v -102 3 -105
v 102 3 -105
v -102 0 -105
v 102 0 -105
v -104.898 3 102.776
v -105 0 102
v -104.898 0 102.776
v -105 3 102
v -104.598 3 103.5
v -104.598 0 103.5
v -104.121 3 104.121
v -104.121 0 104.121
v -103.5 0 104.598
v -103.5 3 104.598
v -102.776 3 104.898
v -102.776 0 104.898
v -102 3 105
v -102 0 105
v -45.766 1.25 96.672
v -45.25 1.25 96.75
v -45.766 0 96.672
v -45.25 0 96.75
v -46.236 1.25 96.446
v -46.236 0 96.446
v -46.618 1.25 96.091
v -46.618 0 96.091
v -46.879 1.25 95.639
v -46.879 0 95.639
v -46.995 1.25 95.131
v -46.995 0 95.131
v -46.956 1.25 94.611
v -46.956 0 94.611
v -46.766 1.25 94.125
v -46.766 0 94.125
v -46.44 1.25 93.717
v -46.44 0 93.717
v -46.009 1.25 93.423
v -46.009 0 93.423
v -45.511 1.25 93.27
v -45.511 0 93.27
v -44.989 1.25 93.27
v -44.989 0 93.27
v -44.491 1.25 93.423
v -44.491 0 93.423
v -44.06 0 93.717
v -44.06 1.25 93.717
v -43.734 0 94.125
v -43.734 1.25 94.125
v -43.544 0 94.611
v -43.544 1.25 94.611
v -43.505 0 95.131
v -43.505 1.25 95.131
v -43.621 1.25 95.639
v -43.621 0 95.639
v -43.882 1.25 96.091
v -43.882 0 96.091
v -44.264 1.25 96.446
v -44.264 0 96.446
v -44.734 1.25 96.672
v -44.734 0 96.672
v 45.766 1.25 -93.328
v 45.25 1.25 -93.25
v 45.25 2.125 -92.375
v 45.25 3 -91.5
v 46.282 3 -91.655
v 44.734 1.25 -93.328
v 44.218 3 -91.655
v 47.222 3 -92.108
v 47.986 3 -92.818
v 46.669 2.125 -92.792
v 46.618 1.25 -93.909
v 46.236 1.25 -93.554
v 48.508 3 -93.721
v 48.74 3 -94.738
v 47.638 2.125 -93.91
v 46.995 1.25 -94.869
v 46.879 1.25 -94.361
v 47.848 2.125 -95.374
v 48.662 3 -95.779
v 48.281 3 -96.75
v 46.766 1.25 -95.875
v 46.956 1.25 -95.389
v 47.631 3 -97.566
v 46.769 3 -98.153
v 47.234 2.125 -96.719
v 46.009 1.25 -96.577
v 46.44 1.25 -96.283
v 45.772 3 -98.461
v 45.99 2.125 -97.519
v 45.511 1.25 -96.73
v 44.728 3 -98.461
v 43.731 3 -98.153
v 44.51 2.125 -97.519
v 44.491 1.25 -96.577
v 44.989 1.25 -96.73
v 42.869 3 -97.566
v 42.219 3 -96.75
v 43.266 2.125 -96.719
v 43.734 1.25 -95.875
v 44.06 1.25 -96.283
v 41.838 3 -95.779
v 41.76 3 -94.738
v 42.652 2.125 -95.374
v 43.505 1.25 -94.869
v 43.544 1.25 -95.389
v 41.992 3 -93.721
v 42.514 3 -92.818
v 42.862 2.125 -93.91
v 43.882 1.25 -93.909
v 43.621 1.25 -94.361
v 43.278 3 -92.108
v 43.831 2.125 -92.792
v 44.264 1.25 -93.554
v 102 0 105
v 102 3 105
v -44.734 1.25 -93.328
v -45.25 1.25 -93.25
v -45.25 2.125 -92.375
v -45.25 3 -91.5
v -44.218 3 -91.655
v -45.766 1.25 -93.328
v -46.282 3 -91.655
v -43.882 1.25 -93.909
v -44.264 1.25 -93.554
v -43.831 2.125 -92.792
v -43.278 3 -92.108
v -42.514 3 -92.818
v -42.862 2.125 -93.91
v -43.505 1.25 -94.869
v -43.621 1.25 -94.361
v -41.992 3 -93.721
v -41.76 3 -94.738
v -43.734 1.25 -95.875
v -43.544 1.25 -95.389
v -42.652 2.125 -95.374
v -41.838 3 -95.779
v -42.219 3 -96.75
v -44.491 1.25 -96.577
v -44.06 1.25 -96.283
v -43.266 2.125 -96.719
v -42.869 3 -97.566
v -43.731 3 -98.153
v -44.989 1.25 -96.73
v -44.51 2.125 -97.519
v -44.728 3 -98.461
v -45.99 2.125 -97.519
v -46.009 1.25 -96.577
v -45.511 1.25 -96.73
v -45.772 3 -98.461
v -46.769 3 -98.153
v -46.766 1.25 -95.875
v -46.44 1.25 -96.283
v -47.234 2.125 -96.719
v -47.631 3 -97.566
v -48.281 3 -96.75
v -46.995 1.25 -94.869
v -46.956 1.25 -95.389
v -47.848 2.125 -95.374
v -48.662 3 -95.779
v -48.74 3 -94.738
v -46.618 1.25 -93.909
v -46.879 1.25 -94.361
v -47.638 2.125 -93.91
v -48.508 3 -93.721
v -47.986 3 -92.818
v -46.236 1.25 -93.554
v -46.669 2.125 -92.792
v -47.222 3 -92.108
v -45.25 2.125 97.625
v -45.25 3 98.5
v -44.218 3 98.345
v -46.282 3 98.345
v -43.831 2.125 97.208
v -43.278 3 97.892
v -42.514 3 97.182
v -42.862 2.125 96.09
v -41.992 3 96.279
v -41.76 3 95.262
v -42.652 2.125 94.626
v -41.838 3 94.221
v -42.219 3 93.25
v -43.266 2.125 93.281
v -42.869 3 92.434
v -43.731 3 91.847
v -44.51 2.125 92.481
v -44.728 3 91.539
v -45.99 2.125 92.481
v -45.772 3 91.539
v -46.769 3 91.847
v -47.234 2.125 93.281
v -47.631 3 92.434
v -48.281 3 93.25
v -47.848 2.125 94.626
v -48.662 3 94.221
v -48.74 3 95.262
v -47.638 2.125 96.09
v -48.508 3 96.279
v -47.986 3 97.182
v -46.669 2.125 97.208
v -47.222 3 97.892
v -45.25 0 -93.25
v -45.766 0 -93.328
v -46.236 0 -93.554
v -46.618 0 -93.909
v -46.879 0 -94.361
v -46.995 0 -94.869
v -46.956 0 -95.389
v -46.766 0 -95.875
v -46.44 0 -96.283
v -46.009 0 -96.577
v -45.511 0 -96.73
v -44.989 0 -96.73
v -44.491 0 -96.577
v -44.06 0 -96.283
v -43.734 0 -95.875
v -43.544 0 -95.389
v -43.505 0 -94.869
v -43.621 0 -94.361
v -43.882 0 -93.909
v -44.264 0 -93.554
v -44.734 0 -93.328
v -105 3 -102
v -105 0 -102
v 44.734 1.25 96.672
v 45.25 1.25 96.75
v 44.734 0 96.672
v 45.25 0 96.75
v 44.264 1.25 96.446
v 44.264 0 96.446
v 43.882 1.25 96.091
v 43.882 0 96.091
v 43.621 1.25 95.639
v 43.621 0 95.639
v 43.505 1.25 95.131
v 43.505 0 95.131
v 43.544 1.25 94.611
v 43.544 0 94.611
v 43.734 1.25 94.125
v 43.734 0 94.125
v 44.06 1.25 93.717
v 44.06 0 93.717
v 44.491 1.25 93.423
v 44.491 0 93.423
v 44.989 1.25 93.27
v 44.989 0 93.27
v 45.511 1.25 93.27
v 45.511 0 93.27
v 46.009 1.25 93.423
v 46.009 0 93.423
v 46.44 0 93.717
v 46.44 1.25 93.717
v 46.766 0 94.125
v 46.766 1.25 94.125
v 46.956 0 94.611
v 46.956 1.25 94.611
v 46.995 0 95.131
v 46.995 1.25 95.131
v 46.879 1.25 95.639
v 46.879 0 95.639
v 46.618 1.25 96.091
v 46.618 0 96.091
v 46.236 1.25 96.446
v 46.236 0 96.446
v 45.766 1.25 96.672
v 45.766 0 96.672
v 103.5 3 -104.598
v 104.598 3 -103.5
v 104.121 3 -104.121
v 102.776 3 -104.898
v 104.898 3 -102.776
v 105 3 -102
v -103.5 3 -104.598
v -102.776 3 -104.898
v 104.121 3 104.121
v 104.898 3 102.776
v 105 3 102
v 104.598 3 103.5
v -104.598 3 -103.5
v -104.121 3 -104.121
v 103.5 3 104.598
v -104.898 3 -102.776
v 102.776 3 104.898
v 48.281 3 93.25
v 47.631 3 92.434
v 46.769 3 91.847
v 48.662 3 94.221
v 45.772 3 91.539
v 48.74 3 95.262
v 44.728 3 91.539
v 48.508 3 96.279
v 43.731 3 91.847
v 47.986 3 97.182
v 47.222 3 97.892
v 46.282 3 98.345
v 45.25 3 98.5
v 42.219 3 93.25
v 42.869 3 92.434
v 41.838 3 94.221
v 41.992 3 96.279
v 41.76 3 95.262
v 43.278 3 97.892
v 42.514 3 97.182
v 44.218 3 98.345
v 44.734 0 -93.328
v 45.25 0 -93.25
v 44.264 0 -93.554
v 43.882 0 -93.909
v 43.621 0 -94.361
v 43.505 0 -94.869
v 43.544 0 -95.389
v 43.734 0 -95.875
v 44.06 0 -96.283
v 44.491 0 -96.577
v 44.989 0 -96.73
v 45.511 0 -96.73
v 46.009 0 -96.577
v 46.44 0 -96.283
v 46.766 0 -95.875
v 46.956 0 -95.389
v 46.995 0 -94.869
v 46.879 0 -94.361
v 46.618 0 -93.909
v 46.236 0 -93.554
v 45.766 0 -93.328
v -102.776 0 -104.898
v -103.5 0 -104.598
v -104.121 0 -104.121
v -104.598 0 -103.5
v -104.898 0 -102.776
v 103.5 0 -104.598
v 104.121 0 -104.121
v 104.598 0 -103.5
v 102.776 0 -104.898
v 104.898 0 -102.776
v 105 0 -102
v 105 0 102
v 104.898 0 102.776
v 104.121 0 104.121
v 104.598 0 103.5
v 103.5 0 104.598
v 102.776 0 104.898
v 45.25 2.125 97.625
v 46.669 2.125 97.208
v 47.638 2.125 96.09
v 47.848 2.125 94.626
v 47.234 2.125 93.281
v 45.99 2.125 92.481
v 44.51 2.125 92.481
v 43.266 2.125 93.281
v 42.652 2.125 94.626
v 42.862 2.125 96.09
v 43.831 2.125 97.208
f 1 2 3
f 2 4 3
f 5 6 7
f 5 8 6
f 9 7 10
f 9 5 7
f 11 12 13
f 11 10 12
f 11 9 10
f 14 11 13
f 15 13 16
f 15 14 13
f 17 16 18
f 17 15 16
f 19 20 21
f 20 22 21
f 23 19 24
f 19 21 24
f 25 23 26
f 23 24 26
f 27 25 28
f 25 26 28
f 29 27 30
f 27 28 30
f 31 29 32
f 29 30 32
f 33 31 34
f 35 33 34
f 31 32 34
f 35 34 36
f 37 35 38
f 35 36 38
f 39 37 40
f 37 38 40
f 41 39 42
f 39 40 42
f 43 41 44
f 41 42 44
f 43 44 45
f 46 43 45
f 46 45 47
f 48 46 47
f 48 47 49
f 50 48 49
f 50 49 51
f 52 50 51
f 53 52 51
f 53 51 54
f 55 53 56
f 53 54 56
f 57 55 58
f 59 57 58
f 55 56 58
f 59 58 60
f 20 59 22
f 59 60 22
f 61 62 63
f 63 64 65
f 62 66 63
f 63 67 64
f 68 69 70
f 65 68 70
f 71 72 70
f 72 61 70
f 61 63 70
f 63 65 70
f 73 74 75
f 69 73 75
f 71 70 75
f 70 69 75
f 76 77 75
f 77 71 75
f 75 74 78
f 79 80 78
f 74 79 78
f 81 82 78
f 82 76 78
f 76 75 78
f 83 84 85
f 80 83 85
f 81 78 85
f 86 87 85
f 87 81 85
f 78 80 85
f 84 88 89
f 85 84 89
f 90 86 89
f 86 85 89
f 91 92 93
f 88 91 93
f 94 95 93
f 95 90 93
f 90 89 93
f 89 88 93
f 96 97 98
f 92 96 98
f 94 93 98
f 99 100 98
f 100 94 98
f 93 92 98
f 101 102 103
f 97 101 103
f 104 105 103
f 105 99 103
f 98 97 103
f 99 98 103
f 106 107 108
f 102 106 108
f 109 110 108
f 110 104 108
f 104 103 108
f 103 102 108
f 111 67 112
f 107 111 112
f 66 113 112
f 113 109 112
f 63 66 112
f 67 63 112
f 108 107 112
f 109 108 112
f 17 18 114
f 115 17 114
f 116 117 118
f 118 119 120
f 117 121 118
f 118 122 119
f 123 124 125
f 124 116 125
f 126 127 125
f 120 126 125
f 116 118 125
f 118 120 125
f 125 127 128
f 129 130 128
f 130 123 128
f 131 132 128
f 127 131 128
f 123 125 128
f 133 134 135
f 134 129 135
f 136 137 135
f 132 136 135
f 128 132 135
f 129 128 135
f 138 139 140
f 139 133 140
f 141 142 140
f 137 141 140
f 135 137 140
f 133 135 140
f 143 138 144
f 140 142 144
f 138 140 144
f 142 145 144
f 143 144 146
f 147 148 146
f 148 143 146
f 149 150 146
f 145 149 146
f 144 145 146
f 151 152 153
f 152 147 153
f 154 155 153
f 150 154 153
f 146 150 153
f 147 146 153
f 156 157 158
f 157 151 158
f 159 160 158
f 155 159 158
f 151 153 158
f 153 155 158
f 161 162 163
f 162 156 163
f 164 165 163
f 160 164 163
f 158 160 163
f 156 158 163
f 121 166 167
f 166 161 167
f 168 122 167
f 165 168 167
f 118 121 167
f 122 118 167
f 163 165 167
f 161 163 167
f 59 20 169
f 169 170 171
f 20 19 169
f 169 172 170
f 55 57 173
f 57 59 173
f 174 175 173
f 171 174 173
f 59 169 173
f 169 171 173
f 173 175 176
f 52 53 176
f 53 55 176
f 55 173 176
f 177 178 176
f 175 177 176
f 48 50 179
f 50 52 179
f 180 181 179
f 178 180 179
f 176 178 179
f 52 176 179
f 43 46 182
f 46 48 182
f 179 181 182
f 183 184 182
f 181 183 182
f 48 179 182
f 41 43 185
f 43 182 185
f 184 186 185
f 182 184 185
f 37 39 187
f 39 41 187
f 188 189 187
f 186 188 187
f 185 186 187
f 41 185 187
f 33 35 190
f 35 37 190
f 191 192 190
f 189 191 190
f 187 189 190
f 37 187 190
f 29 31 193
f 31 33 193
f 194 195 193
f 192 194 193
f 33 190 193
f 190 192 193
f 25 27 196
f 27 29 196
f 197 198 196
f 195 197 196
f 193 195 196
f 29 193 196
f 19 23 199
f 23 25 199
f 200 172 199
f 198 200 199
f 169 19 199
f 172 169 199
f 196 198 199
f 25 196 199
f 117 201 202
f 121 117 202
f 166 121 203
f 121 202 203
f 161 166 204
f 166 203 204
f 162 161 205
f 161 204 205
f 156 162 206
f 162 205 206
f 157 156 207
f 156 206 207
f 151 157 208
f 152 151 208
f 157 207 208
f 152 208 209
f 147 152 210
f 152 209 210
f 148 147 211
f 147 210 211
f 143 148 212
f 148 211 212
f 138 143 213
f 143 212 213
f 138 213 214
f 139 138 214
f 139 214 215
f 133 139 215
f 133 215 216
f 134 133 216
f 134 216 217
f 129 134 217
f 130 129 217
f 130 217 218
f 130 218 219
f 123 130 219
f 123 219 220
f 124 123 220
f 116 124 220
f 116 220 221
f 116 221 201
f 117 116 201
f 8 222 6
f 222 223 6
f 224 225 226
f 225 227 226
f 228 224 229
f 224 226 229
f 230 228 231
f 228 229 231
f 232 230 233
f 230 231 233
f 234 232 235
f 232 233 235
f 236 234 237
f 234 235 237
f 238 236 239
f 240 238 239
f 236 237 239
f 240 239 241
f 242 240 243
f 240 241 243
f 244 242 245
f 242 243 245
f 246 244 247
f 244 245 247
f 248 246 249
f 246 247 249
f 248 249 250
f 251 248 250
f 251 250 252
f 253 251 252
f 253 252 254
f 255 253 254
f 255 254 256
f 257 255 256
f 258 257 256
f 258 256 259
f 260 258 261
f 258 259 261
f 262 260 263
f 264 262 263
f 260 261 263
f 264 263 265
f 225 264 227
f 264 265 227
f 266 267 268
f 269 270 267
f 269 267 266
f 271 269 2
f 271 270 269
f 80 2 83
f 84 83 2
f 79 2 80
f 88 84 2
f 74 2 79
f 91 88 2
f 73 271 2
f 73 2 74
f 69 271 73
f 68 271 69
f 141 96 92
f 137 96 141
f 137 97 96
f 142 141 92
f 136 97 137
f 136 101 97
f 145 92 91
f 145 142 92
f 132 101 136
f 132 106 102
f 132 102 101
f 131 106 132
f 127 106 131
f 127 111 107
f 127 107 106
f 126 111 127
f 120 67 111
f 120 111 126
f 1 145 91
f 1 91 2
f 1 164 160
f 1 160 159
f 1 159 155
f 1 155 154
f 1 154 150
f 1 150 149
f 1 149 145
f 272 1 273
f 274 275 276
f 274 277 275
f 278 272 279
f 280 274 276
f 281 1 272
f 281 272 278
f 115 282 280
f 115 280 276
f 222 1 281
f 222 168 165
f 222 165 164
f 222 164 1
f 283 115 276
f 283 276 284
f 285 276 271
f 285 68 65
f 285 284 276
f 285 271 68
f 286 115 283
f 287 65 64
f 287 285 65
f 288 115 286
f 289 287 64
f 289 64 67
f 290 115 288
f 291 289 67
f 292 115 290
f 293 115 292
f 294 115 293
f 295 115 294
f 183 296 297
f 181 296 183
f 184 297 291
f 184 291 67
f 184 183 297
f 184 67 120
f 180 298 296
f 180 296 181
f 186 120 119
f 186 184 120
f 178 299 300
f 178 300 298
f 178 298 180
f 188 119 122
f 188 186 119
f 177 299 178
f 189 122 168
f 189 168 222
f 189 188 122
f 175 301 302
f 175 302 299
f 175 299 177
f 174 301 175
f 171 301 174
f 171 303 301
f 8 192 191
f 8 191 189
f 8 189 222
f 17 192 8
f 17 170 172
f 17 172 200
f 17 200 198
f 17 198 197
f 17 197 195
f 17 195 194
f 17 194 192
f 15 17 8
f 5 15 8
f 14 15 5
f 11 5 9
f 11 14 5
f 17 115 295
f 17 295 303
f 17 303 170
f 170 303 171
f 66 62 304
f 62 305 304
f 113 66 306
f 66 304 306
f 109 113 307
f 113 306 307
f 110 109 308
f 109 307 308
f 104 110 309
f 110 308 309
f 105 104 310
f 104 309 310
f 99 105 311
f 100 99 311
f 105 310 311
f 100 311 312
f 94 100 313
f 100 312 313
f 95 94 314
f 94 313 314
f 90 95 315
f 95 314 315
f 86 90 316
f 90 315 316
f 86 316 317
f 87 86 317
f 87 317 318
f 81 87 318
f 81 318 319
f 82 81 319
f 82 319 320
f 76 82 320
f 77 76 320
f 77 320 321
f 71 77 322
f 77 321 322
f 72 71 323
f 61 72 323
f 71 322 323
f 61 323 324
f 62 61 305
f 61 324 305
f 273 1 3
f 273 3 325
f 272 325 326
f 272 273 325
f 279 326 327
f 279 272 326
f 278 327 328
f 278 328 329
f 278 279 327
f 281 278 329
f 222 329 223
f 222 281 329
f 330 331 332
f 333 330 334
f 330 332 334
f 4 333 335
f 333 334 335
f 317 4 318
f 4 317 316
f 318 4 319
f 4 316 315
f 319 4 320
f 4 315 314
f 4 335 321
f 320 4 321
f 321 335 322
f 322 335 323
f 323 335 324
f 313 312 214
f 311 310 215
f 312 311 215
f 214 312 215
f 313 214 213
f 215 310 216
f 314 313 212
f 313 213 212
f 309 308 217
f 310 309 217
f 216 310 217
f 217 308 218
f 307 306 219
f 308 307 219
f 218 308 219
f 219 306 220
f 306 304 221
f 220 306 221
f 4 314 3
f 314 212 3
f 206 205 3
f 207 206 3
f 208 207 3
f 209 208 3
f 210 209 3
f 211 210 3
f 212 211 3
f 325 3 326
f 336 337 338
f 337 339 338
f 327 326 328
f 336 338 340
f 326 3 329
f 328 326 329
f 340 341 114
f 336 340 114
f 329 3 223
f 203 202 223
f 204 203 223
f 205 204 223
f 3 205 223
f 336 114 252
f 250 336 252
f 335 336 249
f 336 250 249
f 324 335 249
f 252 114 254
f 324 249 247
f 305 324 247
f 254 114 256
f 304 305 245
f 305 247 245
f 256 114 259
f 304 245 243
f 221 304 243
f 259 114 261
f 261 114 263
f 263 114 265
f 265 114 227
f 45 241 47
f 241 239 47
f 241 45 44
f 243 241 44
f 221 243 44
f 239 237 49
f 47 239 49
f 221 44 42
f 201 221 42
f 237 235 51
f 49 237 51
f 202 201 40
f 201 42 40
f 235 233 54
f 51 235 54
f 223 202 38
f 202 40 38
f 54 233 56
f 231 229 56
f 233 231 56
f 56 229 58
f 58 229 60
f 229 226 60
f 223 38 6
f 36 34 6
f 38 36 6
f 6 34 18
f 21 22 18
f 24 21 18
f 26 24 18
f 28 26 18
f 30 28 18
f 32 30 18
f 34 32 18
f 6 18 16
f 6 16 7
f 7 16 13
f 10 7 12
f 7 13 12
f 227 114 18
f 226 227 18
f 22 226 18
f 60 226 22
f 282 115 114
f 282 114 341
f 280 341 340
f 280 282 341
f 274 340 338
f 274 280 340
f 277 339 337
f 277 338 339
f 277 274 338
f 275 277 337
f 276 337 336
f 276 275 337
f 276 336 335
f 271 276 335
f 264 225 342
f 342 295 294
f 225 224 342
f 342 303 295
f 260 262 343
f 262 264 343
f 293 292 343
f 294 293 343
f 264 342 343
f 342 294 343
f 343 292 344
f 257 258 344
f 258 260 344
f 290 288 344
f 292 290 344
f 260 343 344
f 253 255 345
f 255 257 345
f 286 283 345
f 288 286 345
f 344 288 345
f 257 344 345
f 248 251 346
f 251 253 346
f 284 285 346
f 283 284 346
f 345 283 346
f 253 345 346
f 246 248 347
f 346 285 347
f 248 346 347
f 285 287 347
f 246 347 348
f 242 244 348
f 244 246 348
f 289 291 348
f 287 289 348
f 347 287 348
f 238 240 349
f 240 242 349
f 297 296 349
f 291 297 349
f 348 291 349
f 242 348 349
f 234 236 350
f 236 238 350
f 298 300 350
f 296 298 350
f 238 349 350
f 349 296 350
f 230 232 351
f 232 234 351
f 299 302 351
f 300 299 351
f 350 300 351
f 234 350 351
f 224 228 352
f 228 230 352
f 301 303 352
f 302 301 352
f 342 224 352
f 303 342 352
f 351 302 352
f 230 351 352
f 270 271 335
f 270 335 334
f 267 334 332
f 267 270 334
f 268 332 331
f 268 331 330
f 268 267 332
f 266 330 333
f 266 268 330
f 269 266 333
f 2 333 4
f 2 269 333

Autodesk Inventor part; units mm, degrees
ref_plane "YZ Plane" through (0, 0, 0) normal (1, 0, 0) x (0, 1, 0)
ref_plane "XZ Plane" through (0, 0, 0) normal (0, 1, 0) x (-1, 0, 0)
ref_plane "XY Plane" through (0, 0, 0) normal (0, 0, 1) x (1, 0, 0)
sketch "Sketch1" plane through (0, 0, 0) normal (0, 1, 0) x (-1, 0, 0)
  line L0 (-105, -105) -> (105, -105)
  line L1 (105, -105) -> (105, 105)
  line L2 (105, 105) -> (-105, 105)
  line L3 (-105, 105) -> (-105, -105)
  line L4 (-105, -105) -> (105, 105) construction
  line L5 (105, -105) -> (-105, 105) construction
  point P0 (0, 0)
  dimension "d0" = 210
extrude "Extrusion1" add sketch "Sketch1" along normal blind 3
sketch "Sketch2" plane through (0, 3, 0) normal (0, 1, 0) x (1, 0, 0)
  line L0 (45.25, 95) -> (-45.25, 95) construction
  line L1 (-45.25, 95) -> (-45.25, -95) construction
  line L2 (-45.25, -95) -> (45.25, -95) construction
  line L3 (45.25, -95) -> (45.25, 95) construction
  line L4 (45.25, 95) -> (-45.25, -95) construction
  line L5 (-45.25, 95) -> (45.25, -95) construction
  point P0 (0, 0)
  dimension "d3" = 190
  dimension "d4" = 90.5
hole "Hole1" at (45.25, 3, 95) at (45.25, 3, -95) at (-45.25, 3, -95) at (-45.25, 3, 95) direction (0, -1, 0) diameter 3.5 end through all countersink diameter 7 countersink angle 90
fillet "Fillet1" radius 3 4 edges at (-105, 1.5, 105) (105, 1.5, 105) (105, 1.5, -105) (-105, 1.5, -105)
properties part number "Stock Build Plate"
